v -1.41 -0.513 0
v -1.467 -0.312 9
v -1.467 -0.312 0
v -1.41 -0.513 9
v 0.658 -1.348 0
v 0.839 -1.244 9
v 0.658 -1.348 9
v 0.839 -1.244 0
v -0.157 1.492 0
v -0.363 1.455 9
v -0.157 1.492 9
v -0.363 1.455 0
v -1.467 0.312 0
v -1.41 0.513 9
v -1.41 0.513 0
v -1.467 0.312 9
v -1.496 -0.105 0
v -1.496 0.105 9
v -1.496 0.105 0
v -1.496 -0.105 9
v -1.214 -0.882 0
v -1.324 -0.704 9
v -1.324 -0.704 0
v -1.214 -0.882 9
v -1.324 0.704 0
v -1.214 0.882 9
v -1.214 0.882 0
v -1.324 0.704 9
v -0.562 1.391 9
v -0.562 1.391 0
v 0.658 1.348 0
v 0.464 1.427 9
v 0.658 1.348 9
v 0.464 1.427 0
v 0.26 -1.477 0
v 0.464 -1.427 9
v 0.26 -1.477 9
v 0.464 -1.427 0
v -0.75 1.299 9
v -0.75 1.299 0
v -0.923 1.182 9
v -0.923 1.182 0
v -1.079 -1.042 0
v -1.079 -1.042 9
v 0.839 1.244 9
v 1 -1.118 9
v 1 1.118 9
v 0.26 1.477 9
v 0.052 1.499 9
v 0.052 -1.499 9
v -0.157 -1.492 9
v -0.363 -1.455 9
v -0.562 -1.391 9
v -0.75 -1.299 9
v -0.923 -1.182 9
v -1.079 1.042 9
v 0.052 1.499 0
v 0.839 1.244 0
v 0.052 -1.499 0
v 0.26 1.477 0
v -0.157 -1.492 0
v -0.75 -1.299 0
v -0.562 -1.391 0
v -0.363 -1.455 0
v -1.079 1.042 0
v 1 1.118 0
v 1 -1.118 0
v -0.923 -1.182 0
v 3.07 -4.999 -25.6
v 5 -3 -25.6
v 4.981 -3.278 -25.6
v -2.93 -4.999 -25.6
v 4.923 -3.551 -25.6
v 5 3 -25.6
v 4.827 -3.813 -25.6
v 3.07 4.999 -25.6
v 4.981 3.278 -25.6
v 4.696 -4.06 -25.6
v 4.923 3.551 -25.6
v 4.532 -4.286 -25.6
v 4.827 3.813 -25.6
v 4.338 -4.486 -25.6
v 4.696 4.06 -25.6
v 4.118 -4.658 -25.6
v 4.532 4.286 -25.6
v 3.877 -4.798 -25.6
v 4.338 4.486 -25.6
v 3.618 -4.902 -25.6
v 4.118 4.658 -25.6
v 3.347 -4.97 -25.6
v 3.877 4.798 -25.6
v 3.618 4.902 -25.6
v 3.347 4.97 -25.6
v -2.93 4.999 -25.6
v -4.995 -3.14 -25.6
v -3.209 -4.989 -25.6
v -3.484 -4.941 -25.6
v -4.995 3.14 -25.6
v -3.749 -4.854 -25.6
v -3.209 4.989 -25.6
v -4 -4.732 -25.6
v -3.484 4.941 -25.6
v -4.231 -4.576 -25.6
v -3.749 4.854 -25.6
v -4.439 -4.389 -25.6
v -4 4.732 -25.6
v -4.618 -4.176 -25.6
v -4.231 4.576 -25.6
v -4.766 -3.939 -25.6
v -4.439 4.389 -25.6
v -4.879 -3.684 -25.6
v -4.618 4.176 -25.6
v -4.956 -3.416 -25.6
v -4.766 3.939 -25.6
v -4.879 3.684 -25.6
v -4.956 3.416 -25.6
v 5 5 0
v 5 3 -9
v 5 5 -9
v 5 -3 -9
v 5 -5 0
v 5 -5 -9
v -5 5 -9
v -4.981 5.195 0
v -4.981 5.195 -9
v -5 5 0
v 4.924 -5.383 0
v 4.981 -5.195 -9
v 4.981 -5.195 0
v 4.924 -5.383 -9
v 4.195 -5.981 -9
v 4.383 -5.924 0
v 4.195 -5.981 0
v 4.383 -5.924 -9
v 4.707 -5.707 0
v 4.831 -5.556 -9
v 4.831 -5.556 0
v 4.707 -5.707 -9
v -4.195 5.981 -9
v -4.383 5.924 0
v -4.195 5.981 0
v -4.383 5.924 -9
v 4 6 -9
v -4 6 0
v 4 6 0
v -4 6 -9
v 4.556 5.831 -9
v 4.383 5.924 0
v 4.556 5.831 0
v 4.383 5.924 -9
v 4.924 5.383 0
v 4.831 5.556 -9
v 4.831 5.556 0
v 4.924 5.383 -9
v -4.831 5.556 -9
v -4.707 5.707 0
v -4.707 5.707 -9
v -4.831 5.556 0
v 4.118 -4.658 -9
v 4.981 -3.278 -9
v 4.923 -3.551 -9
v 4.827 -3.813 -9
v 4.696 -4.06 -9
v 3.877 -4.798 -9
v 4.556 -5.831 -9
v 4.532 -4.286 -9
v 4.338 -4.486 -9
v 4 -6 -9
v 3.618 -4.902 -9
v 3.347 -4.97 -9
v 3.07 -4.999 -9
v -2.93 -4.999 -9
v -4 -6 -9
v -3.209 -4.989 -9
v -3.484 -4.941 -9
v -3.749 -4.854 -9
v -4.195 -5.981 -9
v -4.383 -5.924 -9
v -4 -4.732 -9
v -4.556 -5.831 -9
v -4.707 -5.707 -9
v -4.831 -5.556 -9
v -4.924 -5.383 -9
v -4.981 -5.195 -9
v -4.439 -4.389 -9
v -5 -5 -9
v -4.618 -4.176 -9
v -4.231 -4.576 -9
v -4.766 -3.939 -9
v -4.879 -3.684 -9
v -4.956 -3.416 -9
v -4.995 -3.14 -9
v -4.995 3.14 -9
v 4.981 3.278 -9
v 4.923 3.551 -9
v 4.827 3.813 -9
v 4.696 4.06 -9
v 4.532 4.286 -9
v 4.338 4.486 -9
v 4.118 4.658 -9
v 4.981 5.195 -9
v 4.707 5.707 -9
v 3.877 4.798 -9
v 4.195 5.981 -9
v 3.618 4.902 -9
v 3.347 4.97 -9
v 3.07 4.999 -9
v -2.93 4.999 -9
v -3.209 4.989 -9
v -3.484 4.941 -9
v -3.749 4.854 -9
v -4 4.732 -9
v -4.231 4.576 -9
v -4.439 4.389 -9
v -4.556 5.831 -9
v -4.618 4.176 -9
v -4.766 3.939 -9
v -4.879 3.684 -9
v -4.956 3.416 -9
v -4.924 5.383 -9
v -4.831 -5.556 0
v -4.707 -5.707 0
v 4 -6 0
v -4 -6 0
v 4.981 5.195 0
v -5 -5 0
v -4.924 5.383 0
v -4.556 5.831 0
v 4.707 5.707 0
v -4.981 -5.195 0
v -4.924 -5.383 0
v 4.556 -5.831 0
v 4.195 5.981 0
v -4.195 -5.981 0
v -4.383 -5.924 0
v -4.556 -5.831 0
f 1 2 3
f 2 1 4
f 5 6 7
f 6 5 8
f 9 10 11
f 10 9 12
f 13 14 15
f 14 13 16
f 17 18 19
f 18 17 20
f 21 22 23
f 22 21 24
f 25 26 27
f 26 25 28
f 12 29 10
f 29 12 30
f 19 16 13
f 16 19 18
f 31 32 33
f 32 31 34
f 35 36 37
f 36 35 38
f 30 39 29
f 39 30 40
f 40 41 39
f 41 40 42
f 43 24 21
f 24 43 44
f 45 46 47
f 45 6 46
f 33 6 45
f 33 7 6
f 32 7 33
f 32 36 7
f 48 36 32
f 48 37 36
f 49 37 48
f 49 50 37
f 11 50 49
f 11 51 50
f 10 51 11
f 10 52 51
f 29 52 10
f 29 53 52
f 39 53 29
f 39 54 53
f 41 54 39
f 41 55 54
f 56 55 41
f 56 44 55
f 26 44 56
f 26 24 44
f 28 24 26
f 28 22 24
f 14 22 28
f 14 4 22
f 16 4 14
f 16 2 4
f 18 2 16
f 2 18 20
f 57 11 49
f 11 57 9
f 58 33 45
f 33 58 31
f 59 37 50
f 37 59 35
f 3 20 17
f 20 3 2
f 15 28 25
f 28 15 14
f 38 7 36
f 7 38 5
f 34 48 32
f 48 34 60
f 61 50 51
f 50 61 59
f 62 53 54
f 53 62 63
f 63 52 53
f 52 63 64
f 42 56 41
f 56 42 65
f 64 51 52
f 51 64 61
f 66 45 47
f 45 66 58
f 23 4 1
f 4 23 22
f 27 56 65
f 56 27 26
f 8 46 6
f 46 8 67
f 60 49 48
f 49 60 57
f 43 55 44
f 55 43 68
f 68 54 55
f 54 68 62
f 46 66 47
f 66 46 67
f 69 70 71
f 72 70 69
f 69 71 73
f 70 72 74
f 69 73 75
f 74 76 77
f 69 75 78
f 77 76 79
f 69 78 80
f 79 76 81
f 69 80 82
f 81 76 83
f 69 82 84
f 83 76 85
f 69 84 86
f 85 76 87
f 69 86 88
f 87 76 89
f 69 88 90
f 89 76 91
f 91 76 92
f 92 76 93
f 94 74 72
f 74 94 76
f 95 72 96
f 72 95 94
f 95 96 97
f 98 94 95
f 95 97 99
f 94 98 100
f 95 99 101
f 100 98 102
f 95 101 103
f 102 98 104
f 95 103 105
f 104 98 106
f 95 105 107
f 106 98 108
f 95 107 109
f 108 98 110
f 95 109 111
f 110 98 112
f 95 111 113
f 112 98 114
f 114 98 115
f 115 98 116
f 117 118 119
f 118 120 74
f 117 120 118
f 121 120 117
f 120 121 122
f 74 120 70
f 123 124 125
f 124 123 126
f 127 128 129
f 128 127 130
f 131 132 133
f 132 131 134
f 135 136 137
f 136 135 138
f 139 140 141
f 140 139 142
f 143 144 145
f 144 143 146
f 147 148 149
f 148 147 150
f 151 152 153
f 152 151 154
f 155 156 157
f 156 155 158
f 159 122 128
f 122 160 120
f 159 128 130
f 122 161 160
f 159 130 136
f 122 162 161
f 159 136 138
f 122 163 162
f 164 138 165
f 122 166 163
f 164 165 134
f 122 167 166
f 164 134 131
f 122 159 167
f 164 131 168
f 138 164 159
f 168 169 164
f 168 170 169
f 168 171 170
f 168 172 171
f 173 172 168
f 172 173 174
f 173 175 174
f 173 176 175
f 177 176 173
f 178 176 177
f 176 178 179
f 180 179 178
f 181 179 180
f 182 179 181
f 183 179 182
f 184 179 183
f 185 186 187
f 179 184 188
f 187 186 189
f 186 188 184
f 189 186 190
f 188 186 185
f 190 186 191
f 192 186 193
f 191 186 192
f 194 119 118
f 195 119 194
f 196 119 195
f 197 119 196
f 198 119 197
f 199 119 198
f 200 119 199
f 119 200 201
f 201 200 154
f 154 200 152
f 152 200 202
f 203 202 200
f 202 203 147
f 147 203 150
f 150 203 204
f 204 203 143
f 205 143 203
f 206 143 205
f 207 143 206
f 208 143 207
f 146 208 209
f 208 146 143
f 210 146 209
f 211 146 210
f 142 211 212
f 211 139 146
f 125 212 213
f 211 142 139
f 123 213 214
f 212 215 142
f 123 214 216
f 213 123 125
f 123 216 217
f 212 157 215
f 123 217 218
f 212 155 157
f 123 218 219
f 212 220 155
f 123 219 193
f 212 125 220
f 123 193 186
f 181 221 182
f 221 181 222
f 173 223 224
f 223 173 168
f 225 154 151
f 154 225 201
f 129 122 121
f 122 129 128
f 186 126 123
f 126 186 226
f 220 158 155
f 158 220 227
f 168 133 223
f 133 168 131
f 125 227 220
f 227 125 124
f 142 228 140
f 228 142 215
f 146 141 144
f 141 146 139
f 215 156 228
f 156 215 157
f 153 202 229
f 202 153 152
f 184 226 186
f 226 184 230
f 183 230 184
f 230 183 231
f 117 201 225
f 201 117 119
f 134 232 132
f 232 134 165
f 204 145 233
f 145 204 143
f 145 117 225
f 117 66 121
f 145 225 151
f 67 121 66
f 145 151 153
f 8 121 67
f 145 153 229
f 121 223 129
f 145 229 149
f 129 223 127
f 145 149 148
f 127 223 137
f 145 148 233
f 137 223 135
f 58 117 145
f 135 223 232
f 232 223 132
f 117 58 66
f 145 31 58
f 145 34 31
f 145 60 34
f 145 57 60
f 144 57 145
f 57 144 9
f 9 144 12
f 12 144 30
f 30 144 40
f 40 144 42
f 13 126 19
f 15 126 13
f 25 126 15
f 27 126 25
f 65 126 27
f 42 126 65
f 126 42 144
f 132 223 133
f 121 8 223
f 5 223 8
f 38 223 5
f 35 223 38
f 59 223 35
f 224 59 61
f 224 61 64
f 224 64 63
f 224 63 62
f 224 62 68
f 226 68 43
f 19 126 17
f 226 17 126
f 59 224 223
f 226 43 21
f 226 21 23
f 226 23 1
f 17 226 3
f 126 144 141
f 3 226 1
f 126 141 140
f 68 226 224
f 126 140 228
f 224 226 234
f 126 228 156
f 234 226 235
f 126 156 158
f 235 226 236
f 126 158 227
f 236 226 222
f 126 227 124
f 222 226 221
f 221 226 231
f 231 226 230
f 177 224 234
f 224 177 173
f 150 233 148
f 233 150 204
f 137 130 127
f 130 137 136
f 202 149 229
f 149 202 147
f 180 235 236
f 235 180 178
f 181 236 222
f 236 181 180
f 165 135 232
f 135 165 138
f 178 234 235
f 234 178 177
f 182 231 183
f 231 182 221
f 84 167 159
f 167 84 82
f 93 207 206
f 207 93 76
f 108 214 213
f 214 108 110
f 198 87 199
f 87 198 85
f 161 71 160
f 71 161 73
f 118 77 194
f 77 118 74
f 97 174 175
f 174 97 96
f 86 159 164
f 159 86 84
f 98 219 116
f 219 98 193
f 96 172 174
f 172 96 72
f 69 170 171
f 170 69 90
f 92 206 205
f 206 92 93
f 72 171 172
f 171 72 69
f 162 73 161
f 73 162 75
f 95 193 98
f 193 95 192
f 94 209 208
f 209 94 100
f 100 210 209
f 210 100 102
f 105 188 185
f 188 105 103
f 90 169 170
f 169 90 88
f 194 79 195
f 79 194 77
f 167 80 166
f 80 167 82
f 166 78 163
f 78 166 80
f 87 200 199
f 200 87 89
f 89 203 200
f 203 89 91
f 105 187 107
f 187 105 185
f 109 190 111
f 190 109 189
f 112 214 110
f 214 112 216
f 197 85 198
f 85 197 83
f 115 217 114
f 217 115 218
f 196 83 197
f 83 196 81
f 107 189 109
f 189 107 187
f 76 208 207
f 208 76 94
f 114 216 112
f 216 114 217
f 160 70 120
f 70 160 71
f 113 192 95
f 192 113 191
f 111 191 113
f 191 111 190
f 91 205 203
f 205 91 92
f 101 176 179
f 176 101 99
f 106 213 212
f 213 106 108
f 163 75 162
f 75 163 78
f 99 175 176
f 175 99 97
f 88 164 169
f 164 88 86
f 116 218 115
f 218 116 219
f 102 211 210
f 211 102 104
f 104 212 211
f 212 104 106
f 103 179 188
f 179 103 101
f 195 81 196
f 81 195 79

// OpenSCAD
// file: parts/motor_pololu_micro_metal_100_1_hp_6v.scad
// Mechanical contract
// process: purchased-part clearance / assembly visualization; this model is not a printable motor
// material: Pololu 100:1 Micro Metal Gearmotor HP 6V, no encoder, item #1101
// parting_plane: n/a; the purchased motor is represented as one clearance envelope
// opening_direction: output axis is local +Z from the gearbox face toward the D-shaft tip
// fastener: the motor body is an external purchased part; mounting hardware is not modeled here
// seal: n/a
// print_orientation: visualization only; do not print this motor envelope
// units: mm
// source: https://www.pololu.com/product/1101 and the Micro Metal Gearmotor dimensions drawing
// note: official dimensions used here are 10 x 12 mm gearbox cross-section, 9 mm gearbox length,
//       3 mm D output shaft x 9 mm long, and 25.6 mm maximum motor/gearbox body length.

//#region 导入/依赖
// 无外部库；尺寸常量直接对应官方产品/图纸。
//#endregion

//#region 常量/配置
$fa = 8;
$fs = 0.20;

MOTOR_GEARBOX_W = 10.0;
MOTOR_GEARBOX_H = 12.0;
MOTOR_GEARBOX_L = 9.0;
MOTOR_BODY_W = 10.0;
MOTOR_BODY_H = 10.0;
MOTOR_BODY_TOTAL_L = 25.6;
MOTOR_BODY_L = MOTOR_BODY_TOTAL_L - MOTOR_GEARBOX_L;
MOTOR_SHAFT_D = 3.0;
MOTOR_SHAFT_L = 9.0;
MOTOR_SHAFT_FLAT_DEPTH = 0.50;
MOTOR_GEARBOX_CORNER_R = 1.0;
MOTOR_BODY_CORNER_R = 2.0;
MOTOR_TERMINAL_W = 1.5;
MOTOR_TERMINAL_SPACING = 7.0;
MOTOR_TERMINAL_H = 1.4;
MOTOR_EPS = 0.05;
//#endregion

//#region 模型/类型
// 局部坐标：输出齿轮箱前端面 z=0；减速箱/电机向 -Z 延伸；D 轴向 +Z 延伸。
//#endregion

//#region 私有成员
module rounded_prism_xy(w, d, h, r, z0) {
    translate([0, 0, z0])
        hull() {
            for (x = [-w / 2 + r, w / 2 - r], y = [-d / 2 + r, d / 2 - r])
                translate([x, y, 0])
                    cylinder(r = r, h = h);
        }
}

module d_shaft() {
    // 3 mm D shaft: the flat is 0.5 mm in from the circular envelope.
    difference() {
        translate([0, 0, -MOTOR_EPS])
            cylinder(d = MOTOR_SHAFT_D, h = MOTOR_SHAFT_L + MOTOR_EPS);
        translate([
            MOTOR_SHAFT_D / 2 - MOTOR_SHAFT_FLAT_DEPTH,
            -MOTOR_SHAFT_D,
            -2 * MOTOR_EPS
        ])
            cube([
                MOTOR_SHAFT_D,
                2 * MOTOR_SHAFT_D,
                MOTOR_SHAFT_L + 4 * MOTOR_EPS
            ]);
    }
}

module gearbox_body() {
    rounded_prism_xy(
        MOTOR_GEARBOX_W,
        MOTOR_GEARBOX_H,
        MOTOR_GEARBOX_L,
        MOTOR_GEARBOX_CORNER_R,
        -MOTOR_GEARBOX_L
    );
}

module motor_can() {
    rounded_prism_xy(
        MOTOR_BODY_W,
        MOTOR_BODY_H,
        MOTOR_BODY_L + MOTOR_EPS,
        MOTOR_BODY_CORNER_R,
        -MOTOR_BODY_TOTAL_L
    );
}

module rear_terminals() {
    // The product has two narrow rear electrical tabs; cables are sold separately.
    for (x = [-MOTOR_TERMINAL_SPACING / 2, MOTOR_TERMINAL_SPACING / 2])
        translate([x, 0, -MOTOR_BODY_TOTAL_L + MOTOR_TERMINAL_H / 2])
            cube([MOTOR_TERMINAL_W, 2.0, MOTOR_TERMINAL_H], center = true);
}

//#endregion

//#region 公开 API
module pololu_micro_metal_motor_100_1_hp_6v() {
    union() {
        gearbox_body();
        motor_can();
        d_shaft();
        rear_terminals();
    }
}

module pololu_micro_metal_motor_100_1_hp_6v_colored() {
    color("#aeb7c2") gearbox_body();
    color("#343a40") motor_can();
    color("#d6d9dc") d_shaft();
    color("#c28b35") rear_terminals();
}
//#endregion

//#region 业务逻辑
// 输出轴的 D 平面沿局部 +X；与本项目动力轮的 D 孔方向一致。
// 电机总长 25.6 mm 不包含向前伸出的 9 mm 输出轴；装配时 shaft 进入动力轮通孔。
//#endregion

//#region 方法/工具
// 供根文件 use；不要直接把本库文件当作独立导出入口。
//#endregion
// main file
// Pololu 100:1 Micro Metal Gearmotor HP 6V, no encoder (item #1101).
// Standalone model-library entry; the motor is a purchased part and is not for printing.

//#region 导入/依赖
use <parts/motor_pololu_micro_metal_100_1_hp_6v.scad>
//#endregion

//#region 常量/配置
PART = is_undef(PART) ? "motor" : PART;
//#endregion

//#region 模型/类型
// local origin is the output-shaft root / gearbox front face; output axis is +Z.
//#endregion

//#region 公开 API
if (PART == "motor")
    pololu_micro_metal_motor_100_1_hp_6v_colored();
//#endregion

//#region 业务逻辑
// Official mechanical reference: 10 x 12 mm gearbox section, 9 mm gearbox length,
// 3 mm D shaft x 9 mm, 25.6 mm maximum motor/gearbox body length.
//#endregion
